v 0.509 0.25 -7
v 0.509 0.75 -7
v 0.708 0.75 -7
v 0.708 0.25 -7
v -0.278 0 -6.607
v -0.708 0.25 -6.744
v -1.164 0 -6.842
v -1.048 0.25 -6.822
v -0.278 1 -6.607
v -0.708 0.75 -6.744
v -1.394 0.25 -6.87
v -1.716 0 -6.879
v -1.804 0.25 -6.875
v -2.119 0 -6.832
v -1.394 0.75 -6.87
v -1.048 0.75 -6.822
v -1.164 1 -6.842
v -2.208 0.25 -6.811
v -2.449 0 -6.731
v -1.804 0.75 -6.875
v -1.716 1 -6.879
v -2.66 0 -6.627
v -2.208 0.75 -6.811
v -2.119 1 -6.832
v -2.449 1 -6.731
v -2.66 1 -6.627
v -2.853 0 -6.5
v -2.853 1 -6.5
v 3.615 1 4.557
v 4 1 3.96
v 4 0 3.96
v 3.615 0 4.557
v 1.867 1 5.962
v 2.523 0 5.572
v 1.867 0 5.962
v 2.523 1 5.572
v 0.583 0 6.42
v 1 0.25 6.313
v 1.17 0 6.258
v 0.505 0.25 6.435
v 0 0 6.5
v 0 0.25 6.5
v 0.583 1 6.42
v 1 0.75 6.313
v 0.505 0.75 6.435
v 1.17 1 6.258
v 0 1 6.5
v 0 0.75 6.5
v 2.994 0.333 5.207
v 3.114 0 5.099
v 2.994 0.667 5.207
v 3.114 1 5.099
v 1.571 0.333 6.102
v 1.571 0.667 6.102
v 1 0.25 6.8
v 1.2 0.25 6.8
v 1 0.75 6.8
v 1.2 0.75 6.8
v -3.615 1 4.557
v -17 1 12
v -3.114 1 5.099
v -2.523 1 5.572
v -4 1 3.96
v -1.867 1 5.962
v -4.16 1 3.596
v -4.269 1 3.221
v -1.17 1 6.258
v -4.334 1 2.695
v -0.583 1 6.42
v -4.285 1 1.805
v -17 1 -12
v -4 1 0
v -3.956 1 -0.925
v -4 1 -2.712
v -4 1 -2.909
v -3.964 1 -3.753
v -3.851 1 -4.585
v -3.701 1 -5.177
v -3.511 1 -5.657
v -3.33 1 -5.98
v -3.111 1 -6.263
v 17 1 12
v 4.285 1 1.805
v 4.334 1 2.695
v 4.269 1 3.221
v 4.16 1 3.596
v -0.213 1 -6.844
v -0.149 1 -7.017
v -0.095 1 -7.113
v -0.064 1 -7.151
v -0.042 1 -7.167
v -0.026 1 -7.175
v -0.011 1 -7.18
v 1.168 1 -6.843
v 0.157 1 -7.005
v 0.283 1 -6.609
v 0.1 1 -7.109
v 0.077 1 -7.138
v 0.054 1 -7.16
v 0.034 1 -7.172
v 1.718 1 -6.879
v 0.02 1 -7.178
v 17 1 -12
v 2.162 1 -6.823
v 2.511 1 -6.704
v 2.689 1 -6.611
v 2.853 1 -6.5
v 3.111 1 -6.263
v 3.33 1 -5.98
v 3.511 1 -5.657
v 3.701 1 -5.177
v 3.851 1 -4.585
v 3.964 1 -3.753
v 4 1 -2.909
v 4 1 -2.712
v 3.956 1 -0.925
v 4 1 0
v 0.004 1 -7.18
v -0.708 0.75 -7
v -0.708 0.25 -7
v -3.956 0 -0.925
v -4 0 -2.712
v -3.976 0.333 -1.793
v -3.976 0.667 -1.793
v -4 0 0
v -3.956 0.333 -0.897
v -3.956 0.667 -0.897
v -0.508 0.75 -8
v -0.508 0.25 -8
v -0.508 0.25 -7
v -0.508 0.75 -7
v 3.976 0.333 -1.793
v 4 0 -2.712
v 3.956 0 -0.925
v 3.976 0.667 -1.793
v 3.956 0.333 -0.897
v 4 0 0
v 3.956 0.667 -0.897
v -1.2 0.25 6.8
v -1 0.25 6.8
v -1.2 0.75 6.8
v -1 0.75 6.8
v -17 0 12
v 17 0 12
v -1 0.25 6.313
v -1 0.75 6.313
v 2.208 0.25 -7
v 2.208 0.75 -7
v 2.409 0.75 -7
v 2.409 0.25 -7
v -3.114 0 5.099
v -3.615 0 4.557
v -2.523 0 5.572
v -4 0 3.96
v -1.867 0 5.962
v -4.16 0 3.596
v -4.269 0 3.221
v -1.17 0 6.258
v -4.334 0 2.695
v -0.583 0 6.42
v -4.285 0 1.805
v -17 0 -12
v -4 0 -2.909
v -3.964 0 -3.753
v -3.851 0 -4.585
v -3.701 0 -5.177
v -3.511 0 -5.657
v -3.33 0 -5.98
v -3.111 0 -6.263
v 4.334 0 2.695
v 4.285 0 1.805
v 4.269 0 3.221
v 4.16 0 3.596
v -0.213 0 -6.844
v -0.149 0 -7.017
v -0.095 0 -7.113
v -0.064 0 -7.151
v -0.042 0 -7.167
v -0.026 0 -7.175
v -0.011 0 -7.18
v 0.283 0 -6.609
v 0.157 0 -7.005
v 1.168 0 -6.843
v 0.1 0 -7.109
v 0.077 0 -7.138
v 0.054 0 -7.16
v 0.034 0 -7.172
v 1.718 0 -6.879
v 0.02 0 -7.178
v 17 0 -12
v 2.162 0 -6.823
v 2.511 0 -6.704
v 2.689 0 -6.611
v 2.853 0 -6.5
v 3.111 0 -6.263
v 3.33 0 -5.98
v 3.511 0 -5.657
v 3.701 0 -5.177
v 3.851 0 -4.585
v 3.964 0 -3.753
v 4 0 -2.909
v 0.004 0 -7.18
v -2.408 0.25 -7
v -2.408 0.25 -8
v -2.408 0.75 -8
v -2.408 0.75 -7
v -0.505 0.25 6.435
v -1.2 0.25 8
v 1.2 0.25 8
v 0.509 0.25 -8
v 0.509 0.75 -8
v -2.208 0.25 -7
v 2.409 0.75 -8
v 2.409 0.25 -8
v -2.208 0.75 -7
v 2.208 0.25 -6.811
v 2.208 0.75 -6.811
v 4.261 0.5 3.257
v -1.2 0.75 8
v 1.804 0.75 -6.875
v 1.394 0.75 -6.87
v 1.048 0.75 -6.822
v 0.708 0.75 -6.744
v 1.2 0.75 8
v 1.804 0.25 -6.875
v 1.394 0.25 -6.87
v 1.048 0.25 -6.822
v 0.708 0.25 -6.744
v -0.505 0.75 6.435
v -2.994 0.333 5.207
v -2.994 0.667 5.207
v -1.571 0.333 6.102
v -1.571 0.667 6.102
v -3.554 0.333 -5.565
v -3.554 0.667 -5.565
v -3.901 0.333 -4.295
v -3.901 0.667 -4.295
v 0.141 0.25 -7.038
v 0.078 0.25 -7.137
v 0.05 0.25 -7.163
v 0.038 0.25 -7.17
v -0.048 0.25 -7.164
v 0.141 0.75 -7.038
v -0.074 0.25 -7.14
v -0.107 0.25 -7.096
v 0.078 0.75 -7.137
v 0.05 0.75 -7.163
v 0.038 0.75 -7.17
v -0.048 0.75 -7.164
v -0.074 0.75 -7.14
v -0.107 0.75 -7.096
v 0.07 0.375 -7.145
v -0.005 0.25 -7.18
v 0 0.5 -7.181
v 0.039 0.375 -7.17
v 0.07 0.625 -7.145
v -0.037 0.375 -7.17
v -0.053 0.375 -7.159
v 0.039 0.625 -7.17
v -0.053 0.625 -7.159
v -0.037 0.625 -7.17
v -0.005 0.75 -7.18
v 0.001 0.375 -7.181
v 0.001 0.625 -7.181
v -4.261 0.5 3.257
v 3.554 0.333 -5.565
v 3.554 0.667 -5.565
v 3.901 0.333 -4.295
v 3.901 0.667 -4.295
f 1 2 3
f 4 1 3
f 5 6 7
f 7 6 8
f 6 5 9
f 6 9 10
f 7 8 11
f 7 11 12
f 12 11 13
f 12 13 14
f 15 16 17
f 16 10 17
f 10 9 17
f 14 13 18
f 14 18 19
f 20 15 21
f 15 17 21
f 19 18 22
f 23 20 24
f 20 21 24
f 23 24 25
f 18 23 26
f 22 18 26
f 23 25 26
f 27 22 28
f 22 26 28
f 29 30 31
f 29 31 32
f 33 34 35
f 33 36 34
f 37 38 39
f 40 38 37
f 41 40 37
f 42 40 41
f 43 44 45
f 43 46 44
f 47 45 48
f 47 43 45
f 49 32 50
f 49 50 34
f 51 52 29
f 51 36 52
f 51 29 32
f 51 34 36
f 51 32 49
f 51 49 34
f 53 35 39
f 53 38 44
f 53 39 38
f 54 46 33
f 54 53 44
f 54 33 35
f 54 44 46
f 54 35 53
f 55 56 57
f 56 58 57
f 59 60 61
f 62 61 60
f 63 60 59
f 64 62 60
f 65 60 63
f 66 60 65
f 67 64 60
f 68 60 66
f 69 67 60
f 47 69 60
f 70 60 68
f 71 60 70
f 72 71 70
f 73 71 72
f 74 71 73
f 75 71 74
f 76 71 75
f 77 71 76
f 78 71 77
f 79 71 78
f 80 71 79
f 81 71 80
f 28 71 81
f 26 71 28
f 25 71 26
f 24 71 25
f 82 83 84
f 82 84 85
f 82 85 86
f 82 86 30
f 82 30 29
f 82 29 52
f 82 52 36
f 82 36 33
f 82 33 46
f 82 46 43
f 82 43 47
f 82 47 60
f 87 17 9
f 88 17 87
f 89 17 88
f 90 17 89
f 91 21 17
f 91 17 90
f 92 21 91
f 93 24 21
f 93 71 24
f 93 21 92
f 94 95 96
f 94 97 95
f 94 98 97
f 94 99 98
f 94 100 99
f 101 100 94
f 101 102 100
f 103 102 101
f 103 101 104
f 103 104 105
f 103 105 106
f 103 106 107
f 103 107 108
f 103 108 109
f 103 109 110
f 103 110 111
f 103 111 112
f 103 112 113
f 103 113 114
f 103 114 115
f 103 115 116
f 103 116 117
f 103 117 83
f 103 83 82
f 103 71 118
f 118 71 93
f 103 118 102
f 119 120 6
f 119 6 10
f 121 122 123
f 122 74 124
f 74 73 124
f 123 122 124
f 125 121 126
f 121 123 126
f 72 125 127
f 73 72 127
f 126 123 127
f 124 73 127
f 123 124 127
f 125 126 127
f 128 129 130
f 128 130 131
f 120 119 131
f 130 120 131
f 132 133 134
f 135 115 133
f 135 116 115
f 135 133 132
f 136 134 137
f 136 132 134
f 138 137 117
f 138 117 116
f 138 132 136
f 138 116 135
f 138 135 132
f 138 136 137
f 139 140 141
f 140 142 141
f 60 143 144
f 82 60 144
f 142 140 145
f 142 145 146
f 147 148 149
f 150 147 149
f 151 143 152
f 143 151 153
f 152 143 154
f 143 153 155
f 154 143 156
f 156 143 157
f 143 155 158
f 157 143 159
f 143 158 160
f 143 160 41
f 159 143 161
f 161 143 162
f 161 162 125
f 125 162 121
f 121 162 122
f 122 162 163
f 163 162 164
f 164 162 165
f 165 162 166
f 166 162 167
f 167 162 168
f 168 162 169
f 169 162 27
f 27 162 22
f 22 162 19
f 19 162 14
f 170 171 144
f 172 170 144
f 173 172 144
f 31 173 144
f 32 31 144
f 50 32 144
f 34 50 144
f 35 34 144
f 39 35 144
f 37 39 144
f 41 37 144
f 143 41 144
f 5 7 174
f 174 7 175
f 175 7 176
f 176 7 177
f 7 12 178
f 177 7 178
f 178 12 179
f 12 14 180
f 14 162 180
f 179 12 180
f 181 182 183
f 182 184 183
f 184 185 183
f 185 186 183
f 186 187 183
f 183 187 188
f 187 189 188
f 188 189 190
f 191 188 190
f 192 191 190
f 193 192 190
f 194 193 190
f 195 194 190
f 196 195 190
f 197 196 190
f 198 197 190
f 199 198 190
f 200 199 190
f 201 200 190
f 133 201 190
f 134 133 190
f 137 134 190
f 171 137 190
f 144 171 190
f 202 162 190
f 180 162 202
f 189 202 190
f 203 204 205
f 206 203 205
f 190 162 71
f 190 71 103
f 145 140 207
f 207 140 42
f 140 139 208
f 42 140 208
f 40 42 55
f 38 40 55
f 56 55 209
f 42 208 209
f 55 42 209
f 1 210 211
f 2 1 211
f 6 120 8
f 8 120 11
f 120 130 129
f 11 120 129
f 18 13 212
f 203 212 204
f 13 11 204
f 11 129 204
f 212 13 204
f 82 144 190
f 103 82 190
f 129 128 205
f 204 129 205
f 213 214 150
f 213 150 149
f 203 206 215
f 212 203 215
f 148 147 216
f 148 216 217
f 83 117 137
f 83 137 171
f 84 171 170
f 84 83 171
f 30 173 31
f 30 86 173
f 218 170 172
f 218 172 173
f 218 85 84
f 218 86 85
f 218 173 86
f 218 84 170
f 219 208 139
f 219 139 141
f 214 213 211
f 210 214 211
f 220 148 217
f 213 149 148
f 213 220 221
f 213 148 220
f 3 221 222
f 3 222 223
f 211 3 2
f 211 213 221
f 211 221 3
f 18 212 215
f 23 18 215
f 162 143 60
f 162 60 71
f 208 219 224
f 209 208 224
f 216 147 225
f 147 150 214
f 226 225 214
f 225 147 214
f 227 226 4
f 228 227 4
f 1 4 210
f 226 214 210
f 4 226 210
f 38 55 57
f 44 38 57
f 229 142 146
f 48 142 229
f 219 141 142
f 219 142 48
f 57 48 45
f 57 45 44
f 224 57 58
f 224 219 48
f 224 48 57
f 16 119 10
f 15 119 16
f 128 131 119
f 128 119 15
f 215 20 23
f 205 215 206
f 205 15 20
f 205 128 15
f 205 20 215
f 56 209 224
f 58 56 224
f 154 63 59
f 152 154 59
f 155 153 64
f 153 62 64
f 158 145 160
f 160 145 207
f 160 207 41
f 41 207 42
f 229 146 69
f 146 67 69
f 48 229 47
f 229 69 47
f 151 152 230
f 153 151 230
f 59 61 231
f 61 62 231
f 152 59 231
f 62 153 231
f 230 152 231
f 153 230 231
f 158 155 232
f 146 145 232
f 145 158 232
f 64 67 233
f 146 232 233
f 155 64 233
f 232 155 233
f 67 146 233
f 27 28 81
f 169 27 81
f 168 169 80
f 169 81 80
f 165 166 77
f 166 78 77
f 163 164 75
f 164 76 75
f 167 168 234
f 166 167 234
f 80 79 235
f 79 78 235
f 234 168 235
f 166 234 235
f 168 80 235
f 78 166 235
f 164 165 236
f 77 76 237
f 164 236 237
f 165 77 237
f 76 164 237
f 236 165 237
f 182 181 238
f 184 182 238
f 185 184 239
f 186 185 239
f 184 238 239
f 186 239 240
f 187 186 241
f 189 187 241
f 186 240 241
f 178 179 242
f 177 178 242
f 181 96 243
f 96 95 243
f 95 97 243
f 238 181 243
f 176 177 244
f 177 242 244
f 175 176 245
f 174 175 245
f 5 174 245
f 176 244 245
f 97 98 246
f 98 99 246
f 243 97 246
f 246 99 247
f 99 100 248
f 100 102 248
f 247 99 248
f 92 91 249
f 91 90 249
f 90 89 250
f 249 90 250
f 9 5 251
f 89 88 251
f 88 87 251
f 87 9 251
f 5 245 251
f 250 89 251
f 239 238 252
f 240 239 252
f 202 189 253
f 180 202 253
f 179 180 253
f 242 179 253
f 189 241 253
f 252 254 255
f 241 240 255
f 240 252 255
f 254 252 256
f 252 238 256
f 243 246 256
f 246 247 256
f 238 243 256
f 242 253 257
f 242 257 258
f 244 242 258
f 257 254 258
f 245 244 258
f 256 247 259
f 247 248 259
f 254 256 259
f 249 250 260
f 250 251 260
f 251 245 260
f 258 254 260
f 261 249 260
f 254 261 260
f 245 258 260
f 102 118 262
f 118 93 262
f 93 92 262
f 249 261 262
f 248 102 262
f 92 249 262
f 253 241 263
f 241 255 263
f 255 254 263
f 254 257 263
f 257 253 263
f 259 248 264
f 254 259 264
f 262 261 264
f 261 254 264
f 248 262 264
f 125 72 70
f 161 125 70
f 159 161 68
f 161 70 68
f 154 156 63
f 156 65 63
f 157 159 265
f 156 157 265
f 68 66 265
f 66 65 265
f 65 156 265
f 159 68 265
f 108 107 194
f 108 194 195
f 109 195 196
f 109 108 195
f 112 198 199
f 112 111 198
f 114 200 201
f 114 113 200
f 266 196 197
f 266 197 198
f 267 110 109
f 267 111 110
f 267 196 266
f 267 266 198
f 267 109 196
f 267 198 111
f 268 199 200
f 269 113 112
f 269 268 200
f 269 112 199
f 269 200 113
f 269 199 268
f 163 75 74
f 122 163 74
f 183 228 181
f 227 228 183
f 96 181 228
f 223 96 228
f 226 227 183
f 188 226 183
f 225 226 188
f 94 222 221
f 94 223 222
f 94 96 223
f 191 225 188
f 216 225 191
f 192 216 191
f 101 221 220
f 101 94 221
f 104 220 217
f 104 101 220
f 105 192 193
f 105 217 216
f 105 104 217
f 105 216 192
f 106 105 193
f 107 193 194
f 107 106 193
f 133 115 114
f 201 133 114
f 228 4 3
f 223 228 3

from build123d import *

# Parameters (mm, degrees)
SKETCH_2_W             = 34
SKETCH_2_H             = 24
EXTRUDE_1_DEPTH        = 1
CUT_EXTRUDE_2_DEPTH    = 1
SKETCH_4_W             = 2
SKETCH_4_H             = 0.5
CUT_EXTRUDE_3_DEPTH    = 3
SKETCH_5_W             = 1.5
SKETCH_5_H             = 0.5
CUT_EXTRUDE_4_DEPTH    = 3
SKETCH_6_W             = 0.2
SKETCH_6_H             = 0.5
CUT_EXTRUDE_6_DEPTH    = 1.2
SKETCH_7_W             = 0.2
SKETCH_7_H             = 0.5
CUT_EXTRUDE_7_DEPTH    = 1
PATTERN_LINEAR_1_COUNT = 2
PATTERN_LINEAR_1_PITCH = 2.917


with BuildPart() as part:
    # 草图2 → 凸台-拉伸1 (new body)
    with BuildSketch(Plane(origin=(0, 0, 0), x_dir=(1, 0, 0), z_dir=(0, 1, 0))):
        Rectangle(SKETCH_2_W, SKETCH_2_H)
    extrude(amount=EXTRUDE_1_DEPTH)

    # 草图3 → 切除-拉伸2 (cut)
    with BuildSketch(Plane(origin=(0, 1, 0), x_dir=(1, 0, 0), z_dir=(0, 1, 0))):
        with BuildLine():
            Line((2.852693105, 6.5), (0, 6.5))
            Line((0, 6.5), (0, -6.5))
            add(Edge.make_bspline(
                [(4, -3.960322269), (3.291830105, -5.33321398), (1.554438327, -6.399660403), (0, -6.5)],
                knots=[0.726831855, 0.726831855, 0.726831855, 0.726831855, 0.974825143, 0.974825143, 0.974825143, 0.974825143], degree=3))
            Line((4, -3.960322269), (4, 0))
            add(Edge.make_bspline(
                [(4, 2.711962076), (3.993732983, 1.774234816), (3.903899915, 0.904091061), (4, 0)],
                knots=[0.362705738, 0.362705738, 0.362705738, 0.362705738, 0.509475385, 0.509475385, 0.509475385, 0.509475385], degree=3))
            Line((4, 2.711962076), (4, 2.909239089))
            add(Edge.make_bspline(
                [(2.852693105, 6.5), (3.766558676, 5.806047297), (3.99030544, 4.279578326), (4, 2.909239089)],
                knots=[0.140232201, 0.140232201, 0.140232201, 0.140232201, 0.352466659, 0.352466659, 0.352466659, 0.352466659], degree=3))
        make_face()
        with BuildLine():
            Line((0, -6.5), (0, 6.5))
            Line((0, 6.5), (-2.852693105, 6.5))
            add(Edge.make_bspline(
                [(-2.852693105, 6.5), (-3.766558676, 5.806047297), (-3.99030544, 4.279578326), (-4, 2.909239089)],
                knots=[0.140232201, 0.140232201, 0.140232201, 0.140232201, 0.352466659, 0.352466659, 0.352466659, 0.352466659], degree=3))
            Line((-4, 2.909239089), (-4, 2.711962076))
            add(Edge.make_bspline(
                [(-4, 2.711962076), (-3.993732983, 1.774234816), (-3.903899915, 0.904091061), (-4, 0)],
                knots=[0.362705738, 0.362705738, 0.362705738, 0.362705738, 0.509475385, 0.509475385, 0.509475385, 0.509475385], degree=3))
            Line((-4, 0), (-4, -3.960322269))
            add(Edge.make_bspline(
                [(-4, -3.960322269), (-3.291830105, -5.33321398), (-1.554438327, -6.399660403), (0, -6.5)],
                knots=[0.726831855, 0.726831855, 0.726831855, 0.726831855, 0.974825143, 0.974825143, 0.974825143, 0.974825143], degree=3))
        make_face()
        with BuildLine():
            add(Edge.make_bspline(
                [(0, 6.5), (0.096578276, 6.539787769), (0.190890779, 6.57622482), (0.282988495, 6.609417035)],
                knots=[0, 0, 0, 0, 0.010078853, 0.010078853, 0.010078853, 0.010078853], degree=3))
            Line((0, 6.5), (2.852693105, 6.5))
            add(Edge.make_bspline(
                [(0.282988495, 6.609417035), (1.47229303, 7.038044945), (2.292262606, 6.925568347), (2.852693105, 6.5)],
                knots=[0.010078853, 0.010078853, 0.010078853, 0.010078853, 0.140232201, 0.140232201, 0.140232201, 0.140232201], degree=3))
        make_face()
        with BuildLine():
            Line((-2.852693105, 6.5), (0, 6.5))
            add(Edge.make_bspline(
                [(0, 6.5), (-0.094670577, 6.539001846), (-0.187164009, 6.574784039), (-0.277528318, 6.60744631)],
                knots=[0, 0, 0, 0, 0.009879767, 0.009879767, 0.009879767, 0.009879767], degree=3))
            add(Edge.make_bspline(
                [(-0.277528318, 6.60744631), (-1.469783924, 7.038388308), (-2.291405355, 6.926219308), (-2.852693105, 6.5)],
                knots=[0.009879767, 0.009879767, 0.009879767, 0.009879767, 0.140232201, 0.140232201, 0.140232201, 0.140232201], degree=3))
        make_face()
        with BuildLine():
            add(Edge.make_bspline(
                [(0, 6.5), (-0.094670577, 6.539001846), (-0.187164009, 6.574784039), (-0.277528318, 6.60744631)],
                knots=[0, 0, 0, 0, 0.009879767, 0.009879767, 0.009879767, 0.009879767], degree=3))
            add(Edge.make_bspline(
                [(0, 6.5), (0.096578276, 6.539787769), (0.190890779, 6.57622482), (0.282988495, 6.609417035)],
                knots=[0, 0, 0, 0, 0.010078853, 0.010078853, 0.010078853, 0.010078853], degree=3))
            add(Edge.make_bspline(
                [(0.282988495, 6.609417035), (-0.002451987, 7.75268333), (-0.277528318, 6.60744631)],
                knots=[0, 0, 0, 1, 1, 1], degree=2))
        make_face()
        with BuildLine():
            add(Edge.make_bspline(
                [(-4, 0), (-4.115462181, -1.086245927), (-4.588613513, -2.485549912), (-4.117125058, -3.733258083), (-4, -3.960322269)],
                knots=[0.509475385, 0.509475385, 0.509475385, 0.509475385, 0.685815952, 0.726831855, 0.726831855, 0.726831855, 0.726831855], degree=3))
            Line((-4, -3.960322269), (-4, 0))
        make_face()
        with BuildLine():
            Line((4, 0), (4, -3.960322269))
            add(Edge.make_bspline(
                [(4, 0), (4.115462181, -1.086245927), (4.588613513, -2.485549912), (4.117125058, -3.733258083), (4, -3.960322269)],
                knots=[0.509475385, 0.509475385, 0.509475385, 0.509475385, 0.685815952, 0.726831855, 0.726831855, 0.726831855, 0.726831855], degree=3))
        make_face()
    extrude(amount=-CUT_EXTRUDE_2_DEPTH, mode=Mode.SUBTRACT)

    # 草图4 → 切除-拉伸3 (cut)
    with BuildSketch(Plane.XY.offset(8)):
        with Locations((0, 0.5)):
            Rectangle(SKETCH_4_W, SKETCH_4_H)
    extrude(amount=-CUT_EXTRUDE_3_DEPTH, mode=Mode.SUBTRACT)

    # 草图5 → 切除-拉伸4 (cut)
    with BuildSketch(Plane(origin=(0, 0, -8), x_dir=(-1, 0, 0), z_dir=(0, 0, -1))):
        with Locations((1.458123879, 0.5)):
            Rectangle(SKETCH_5_W, SKETCH_5_H)
        with Locations((-1.458123879, 0.5)):
            Rectangle(SKETCH_5_W, SKETCH_5_H)
    extrude(amount=-CUT_EXTRUDE_4_DEPTH, mode=Mode.SUBTRACT)

    # 草图6 → 切除-拉伸6 (cut)
    with BuildSketch(Plane(origin=(0, 0, 8), x_dir=(-1, 0, 0), z_dir=(0, 0, -1))):
        with Locations((1.1, 0.5)):
            Rectangle(SKETCH_6_W, SKETCH_6_H)
        Polygon((1, 0.75), (-1, 0.25), (1, 0.25), align=None)
        Polygon((1, 0.75), (-1, 0.25), (-1, 0.75), align=None)
        with Locations((-1.1, 0.5)):
            Rectangle(SKETCH_6_W, SKETCH_6_H)
    extrude(amount=CUT_EXTRUDE_6_DEPTH, mode=Mode.SUBTRACT)

    # 草图7 → 切除-拉伸7 (cut)
    with BuildSketch(Plane.XY.offset(-8)):
        Polygon((-0.708123879, 0.25), (-2.208123879, 0.75), (-2.208123879, 0.25), align=None)
        with Locations((-2.308123879, 0.5)):
            Rectangle(SKETCH_7_W, SKETCH_7_H)
        Polygon((-0.708123879, 0.25), (-2.208123879, 0.75), (-0.708123879, 0.75), align=None)
        with Locations((-0.608123879, 0.5)):
            Rectangle(SKETCH_7_W, SKETCH_7_H)
    cut_extrude_7 = extrude(amount=CUT_EXTRUDE_7_DEPTH, mode=Mode.SUBTRACT)

    # 阵列(线性)1: 切除-拉伸7 ×2
    with Locations(*[(i * PATTERN_LINEAR_1_PITCH, 0, 0) for i in range(1, PATTERN_LINEAR_1_COUNT)]):
        add(cut_extrude_7, mode=Mode.SUBTRACT)


solid = part.part
